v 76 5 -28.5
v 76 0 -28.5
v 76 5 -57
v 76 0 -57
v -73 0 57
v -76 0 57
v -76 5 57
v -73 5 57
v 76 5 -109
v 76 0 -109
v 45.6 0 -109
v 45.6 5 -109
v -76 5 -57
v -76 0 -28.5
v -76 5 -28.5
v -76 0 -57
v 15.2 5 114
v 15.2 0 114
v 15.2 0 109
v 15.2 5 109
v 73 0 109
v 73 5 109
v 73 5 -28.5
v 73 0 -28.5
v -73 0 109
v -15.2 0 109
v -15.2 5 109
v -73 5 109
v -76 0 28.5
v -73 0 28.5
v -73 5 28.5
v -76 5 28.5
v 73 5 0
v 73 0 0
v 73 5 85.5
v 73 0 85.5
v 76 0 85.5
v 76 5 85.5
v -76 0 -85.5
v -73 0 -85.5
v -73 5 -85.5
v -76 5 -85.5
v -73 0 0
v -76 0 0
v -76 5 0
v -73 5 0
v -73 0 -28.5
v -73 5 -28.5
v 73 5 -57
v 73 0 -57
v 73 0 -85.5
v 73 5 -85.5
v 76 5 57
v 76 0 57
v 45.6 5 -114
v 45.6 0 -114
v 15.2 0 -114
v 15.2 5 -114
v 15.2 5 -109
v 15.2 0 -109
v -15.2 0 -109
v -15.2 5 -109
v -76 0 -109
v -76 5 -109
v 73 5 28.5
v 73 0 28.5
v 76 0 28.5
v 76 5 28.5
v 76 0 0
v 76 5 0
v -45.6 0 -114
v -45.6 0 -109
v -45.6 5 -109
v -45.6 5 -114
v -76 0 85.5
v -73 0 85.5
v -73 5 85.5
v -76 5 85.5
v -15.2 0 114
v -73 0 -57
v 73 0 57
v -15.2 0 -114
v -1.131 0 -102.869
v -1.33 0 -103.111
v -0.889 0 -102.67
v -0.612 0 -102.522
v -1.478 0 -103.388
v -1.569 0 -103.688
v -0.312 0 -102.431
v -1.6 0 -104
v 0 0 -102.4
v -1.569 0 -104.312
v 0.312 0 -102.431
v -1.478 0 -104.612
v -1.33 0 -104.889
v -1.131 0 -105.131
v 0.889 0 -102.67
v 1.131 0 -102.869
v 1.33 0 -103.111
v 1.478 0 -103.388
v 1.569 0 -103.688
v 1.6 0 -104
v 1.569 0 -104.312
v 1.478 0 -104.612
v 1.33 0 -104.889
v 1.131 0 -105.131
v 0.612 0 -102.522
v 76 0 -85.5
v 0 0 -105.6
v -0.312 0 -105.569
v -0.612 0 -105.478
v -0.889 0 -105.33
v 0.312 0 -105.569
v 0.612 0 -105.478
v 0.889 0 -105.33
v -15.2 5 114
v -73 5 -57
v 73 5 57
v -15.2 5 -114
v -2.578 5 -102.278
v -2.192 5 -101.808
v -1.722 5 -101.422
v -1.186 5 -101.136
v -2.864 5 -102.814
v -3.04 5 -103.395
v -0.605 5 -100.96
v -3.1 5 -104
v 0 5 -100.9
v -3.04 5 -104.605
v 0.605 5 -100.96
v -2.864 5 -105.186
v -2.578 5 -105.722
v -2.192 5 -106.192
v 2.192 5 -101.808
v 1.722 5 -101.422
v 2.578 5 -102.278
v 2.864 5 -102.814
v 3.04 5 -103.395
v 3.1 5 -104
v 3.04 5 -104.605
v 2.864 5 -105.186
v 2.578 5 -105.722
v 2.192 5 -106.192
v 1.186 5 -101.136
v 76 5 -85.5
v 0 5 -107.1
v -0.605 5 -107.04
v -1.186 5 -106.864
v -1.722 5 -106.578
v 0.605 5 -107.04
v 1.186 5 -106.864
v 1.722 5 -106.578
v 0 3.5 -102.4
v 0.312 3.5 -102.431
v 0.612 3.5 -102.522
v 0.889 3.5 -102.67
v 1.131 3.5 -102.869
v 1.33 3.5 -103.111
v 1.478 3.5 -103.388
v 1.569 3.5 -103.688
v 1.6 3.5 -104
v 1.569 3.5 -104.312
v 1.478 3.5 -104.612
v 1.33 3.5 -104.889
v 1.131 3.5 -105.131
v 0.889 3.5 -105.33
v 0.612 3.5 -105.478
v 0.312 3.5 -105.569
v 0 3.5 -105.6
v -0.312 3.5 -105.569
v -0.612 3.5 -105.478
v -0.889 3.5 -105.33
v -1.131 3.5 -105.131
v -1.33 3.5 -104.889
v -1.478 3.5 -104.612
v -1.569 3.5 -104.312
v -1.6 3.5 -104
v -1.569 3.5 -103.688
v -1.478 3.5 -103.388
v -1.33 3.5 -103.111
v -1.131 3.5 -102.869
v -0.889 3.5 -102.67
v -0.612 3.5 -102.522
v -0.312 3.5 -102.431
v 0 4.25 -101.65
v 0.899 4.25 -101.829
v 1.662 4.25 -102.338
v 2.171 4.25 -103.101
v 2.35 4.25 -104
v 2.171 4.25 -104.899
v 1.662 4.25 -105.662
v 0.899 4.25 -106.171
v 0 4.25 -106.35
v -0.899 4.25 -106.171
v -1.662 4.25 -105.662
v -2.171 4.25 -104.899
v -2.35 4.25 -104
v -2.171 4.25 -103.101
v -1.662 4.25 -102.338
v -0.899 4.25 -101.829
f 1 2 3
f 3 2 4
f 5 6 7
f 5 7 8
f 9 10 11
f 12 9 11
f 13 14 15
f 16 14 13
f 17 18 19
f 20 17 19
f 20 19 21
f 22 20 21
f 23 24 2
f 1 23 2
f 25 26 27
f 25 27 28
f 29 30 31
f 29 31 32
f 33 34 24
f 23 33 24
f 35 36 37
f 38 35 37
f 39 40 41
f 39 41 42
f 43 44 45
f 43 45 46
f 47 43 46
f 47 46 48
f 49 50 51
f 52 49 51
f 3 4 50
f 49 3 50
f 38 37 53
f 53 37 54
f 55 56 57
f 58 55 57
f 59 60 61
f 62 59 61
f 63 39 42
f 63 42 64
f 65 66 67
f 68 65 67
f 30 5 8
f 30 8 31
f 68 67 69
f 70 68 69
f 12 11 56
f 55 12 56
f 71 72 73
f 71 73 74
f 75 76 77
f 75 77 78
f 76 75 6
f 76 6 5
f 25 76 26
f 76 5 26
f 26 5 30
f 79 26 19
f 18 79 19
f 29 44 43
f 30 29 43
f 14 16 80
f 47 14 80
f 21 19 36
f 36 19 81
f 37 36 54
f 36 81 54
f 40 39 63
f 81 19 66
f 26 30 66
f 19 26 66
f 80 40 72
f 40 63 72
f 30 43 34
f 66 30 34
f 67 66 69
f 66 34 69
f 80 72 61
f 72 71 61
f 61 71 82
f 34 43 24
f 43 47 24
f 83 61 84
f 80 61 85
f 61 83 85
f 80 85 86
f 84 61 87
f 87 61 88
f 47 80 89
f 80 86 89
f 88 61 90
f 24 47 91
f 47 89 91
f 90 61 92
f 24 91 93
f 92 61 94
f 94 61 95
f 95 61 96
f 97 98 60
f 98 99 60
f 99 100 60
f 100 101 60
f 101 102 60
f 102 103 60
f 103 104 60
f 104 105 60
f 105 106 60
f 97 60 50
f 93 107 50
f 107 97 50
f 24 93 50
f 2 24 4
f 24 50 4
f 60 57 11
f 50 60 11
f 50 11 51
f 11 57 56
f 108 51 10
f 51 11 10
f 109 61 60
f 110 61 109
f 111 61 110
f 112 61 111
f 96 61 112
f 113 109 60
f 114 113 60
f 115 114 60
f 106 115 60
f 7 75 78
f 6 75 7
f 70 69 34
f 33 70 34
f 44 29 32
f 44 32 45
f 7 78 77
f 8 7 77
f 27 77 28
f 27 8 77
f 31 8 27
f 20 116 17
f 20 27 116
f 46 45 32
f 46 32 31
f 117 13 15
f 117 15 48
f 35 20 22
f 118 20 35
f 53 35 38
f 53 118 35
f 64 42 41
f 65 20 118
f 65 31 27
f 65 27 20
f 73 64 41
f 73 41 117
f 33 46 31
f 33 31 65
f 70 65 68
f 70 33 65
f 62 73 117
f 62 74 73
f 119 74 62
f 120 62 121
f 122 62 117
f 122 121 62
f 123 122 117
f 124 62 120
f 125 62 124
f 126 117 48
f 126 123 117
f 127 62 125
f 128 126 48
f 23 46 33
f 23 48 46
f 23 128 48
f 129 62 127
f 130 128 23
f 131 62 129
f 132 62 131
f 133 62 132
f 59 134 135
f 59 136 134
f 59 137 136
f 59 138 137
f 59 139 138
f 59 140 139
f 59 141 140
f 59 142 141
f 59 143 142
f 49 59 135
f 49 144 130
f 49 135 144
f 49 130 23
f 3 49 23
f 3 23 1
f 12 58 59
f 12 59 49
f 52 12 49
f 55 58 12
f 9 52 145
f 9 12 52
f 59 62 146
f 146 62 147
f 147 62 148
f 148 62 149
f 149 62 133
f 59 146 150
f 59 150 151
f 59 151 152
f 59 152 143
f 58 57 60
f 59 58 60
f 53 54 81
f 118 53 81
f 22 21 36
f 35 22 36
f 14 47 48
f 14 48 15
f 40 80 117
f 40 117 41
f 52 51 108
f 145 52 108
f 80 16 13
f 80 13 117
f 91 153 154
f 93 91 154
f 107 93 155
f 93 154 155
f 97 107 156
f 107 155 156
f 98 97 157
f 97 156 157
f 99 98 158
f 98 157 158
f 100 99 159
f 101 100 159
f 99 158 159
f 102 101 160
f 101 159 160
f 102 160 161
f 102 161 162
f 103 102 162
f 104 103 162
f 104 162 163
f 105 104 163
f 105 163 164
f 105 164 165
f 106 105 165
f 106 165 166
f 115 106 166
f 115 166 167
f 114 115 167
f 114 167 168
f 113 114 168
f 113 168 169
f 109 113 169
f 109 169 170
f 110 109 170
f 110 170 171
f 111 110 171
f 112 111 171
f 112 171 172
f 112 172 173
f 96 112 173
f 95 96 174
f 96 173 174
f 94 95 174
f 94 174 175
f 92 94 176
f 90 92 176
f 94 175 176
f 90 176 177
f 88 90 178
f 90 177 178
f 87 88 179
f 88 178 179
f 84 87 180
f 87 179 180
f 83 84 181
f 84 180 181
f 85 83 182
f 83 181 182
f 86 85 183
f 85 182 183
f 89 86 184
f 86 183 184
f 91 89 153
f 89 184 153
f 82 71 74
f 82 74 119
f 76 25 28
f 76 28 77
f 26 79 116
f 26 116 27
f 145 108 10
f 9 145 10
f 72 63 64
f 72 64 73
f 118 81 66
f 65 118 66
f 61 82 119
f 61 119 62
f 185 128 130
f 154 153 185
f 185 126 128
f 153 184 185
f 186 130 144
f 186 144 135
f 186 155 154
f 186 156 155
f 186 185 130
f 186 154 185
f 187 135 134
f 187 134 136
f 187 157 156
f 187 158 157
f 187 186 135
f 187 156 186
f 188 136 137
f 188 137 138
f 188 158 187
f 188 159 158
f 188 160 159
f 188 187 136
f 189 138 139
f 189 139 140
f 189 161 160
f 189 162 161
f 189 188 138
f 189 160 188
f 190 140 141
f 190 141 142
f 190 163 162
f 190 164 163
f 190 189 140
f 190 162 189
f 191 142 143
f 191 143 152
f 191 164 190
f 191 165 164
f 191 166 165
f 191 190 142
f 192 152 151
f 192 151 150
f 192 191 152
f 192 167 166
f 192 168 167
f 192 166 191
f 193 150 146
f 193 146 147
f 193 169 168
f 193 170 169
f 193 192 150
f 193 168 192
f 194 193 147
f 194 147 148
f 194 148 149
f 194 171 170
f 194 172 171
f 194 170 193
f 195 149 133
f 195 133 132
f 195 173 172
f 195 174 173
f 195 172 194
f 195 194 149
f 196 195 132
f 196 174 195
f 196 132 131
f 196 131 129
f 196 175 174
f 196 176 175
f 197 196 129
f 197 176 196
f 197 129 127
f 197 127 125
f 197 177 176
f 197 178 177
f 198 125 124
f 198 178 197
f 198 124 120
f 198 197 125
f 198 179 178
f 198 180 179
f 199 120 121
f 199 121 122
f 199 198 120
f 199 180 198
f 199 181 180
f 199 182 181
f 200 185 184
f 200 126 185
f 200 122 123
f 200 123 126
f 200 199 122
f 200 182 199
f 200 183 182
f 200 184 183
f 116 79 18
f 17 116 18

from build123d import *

# Parameters (mm, degrees)
BOSS_EXTRUDE1_DEPTH = 5
SKETCH2_R           = 1.6
CUT_EXTRUDE1_DEPTH  = 138.102151697
CHAMFER1_SIZE       = 1.5


with BuildPart() as part:
    # Sketch1 → Boss-Extrude1 (new body)
    with BuildSketch(Plane(origin=(0, 0, 0), x_dir=(1, 0, 0), z_dir=(0, 1, 0))):
        Polygon((0, -114), (-15.2, -114), (-15.2, -109), (-73, -109), (-73, -85.5), (-76, -85.5), (-76, -57), (-73, -57), (-73, -28.5), (-76, -28.5), (-76, 0), (-73, 0), (-73, 28.5), (-76, 28.5), (-76, 57), (-73, 57), (-73, 85.5), (-76, 85.5), (-76, 109), (-45.6, 109), (-45.6, 114), (-15.2, 114), (-15.2, 109), (0, 109), align=None)
    boss_extrude1 = extrude(amount=BOSS_EXTRUDE1_DEPTH)

    # Mirror1: Boss-Extrude1 across plane
    add(boss_extrude1.mirror(Plane(origin=(0, 5, 0), x_dir=(0, 0, 1), z_dir=(1, 0, 0))))

    # Sketch2 → Cut-Extrude1 (cut, through all)
    with BuildSketch(Plane(origin=(0, 5, 0), x_dir=(1, 0, 0), z_dir=(0, 1, 0))):
        with Locations(Location((0, 104, 0), (0, 0, 270))):
            Circle(SKETCH2_R)
    extrude(amount=-CUT_EXTRUDE1_DEPTH, mode=Mode.SUBTRACT)

    # Chamfer1
    chamfer1_edges = [part.edges().sort_by_distance(p)[0] for p in [
        (0, 5, -105.6),
    ]]
    chamfer(chamfer1_edges, length=CHAMFER1_SIZE)


solid = part.part
